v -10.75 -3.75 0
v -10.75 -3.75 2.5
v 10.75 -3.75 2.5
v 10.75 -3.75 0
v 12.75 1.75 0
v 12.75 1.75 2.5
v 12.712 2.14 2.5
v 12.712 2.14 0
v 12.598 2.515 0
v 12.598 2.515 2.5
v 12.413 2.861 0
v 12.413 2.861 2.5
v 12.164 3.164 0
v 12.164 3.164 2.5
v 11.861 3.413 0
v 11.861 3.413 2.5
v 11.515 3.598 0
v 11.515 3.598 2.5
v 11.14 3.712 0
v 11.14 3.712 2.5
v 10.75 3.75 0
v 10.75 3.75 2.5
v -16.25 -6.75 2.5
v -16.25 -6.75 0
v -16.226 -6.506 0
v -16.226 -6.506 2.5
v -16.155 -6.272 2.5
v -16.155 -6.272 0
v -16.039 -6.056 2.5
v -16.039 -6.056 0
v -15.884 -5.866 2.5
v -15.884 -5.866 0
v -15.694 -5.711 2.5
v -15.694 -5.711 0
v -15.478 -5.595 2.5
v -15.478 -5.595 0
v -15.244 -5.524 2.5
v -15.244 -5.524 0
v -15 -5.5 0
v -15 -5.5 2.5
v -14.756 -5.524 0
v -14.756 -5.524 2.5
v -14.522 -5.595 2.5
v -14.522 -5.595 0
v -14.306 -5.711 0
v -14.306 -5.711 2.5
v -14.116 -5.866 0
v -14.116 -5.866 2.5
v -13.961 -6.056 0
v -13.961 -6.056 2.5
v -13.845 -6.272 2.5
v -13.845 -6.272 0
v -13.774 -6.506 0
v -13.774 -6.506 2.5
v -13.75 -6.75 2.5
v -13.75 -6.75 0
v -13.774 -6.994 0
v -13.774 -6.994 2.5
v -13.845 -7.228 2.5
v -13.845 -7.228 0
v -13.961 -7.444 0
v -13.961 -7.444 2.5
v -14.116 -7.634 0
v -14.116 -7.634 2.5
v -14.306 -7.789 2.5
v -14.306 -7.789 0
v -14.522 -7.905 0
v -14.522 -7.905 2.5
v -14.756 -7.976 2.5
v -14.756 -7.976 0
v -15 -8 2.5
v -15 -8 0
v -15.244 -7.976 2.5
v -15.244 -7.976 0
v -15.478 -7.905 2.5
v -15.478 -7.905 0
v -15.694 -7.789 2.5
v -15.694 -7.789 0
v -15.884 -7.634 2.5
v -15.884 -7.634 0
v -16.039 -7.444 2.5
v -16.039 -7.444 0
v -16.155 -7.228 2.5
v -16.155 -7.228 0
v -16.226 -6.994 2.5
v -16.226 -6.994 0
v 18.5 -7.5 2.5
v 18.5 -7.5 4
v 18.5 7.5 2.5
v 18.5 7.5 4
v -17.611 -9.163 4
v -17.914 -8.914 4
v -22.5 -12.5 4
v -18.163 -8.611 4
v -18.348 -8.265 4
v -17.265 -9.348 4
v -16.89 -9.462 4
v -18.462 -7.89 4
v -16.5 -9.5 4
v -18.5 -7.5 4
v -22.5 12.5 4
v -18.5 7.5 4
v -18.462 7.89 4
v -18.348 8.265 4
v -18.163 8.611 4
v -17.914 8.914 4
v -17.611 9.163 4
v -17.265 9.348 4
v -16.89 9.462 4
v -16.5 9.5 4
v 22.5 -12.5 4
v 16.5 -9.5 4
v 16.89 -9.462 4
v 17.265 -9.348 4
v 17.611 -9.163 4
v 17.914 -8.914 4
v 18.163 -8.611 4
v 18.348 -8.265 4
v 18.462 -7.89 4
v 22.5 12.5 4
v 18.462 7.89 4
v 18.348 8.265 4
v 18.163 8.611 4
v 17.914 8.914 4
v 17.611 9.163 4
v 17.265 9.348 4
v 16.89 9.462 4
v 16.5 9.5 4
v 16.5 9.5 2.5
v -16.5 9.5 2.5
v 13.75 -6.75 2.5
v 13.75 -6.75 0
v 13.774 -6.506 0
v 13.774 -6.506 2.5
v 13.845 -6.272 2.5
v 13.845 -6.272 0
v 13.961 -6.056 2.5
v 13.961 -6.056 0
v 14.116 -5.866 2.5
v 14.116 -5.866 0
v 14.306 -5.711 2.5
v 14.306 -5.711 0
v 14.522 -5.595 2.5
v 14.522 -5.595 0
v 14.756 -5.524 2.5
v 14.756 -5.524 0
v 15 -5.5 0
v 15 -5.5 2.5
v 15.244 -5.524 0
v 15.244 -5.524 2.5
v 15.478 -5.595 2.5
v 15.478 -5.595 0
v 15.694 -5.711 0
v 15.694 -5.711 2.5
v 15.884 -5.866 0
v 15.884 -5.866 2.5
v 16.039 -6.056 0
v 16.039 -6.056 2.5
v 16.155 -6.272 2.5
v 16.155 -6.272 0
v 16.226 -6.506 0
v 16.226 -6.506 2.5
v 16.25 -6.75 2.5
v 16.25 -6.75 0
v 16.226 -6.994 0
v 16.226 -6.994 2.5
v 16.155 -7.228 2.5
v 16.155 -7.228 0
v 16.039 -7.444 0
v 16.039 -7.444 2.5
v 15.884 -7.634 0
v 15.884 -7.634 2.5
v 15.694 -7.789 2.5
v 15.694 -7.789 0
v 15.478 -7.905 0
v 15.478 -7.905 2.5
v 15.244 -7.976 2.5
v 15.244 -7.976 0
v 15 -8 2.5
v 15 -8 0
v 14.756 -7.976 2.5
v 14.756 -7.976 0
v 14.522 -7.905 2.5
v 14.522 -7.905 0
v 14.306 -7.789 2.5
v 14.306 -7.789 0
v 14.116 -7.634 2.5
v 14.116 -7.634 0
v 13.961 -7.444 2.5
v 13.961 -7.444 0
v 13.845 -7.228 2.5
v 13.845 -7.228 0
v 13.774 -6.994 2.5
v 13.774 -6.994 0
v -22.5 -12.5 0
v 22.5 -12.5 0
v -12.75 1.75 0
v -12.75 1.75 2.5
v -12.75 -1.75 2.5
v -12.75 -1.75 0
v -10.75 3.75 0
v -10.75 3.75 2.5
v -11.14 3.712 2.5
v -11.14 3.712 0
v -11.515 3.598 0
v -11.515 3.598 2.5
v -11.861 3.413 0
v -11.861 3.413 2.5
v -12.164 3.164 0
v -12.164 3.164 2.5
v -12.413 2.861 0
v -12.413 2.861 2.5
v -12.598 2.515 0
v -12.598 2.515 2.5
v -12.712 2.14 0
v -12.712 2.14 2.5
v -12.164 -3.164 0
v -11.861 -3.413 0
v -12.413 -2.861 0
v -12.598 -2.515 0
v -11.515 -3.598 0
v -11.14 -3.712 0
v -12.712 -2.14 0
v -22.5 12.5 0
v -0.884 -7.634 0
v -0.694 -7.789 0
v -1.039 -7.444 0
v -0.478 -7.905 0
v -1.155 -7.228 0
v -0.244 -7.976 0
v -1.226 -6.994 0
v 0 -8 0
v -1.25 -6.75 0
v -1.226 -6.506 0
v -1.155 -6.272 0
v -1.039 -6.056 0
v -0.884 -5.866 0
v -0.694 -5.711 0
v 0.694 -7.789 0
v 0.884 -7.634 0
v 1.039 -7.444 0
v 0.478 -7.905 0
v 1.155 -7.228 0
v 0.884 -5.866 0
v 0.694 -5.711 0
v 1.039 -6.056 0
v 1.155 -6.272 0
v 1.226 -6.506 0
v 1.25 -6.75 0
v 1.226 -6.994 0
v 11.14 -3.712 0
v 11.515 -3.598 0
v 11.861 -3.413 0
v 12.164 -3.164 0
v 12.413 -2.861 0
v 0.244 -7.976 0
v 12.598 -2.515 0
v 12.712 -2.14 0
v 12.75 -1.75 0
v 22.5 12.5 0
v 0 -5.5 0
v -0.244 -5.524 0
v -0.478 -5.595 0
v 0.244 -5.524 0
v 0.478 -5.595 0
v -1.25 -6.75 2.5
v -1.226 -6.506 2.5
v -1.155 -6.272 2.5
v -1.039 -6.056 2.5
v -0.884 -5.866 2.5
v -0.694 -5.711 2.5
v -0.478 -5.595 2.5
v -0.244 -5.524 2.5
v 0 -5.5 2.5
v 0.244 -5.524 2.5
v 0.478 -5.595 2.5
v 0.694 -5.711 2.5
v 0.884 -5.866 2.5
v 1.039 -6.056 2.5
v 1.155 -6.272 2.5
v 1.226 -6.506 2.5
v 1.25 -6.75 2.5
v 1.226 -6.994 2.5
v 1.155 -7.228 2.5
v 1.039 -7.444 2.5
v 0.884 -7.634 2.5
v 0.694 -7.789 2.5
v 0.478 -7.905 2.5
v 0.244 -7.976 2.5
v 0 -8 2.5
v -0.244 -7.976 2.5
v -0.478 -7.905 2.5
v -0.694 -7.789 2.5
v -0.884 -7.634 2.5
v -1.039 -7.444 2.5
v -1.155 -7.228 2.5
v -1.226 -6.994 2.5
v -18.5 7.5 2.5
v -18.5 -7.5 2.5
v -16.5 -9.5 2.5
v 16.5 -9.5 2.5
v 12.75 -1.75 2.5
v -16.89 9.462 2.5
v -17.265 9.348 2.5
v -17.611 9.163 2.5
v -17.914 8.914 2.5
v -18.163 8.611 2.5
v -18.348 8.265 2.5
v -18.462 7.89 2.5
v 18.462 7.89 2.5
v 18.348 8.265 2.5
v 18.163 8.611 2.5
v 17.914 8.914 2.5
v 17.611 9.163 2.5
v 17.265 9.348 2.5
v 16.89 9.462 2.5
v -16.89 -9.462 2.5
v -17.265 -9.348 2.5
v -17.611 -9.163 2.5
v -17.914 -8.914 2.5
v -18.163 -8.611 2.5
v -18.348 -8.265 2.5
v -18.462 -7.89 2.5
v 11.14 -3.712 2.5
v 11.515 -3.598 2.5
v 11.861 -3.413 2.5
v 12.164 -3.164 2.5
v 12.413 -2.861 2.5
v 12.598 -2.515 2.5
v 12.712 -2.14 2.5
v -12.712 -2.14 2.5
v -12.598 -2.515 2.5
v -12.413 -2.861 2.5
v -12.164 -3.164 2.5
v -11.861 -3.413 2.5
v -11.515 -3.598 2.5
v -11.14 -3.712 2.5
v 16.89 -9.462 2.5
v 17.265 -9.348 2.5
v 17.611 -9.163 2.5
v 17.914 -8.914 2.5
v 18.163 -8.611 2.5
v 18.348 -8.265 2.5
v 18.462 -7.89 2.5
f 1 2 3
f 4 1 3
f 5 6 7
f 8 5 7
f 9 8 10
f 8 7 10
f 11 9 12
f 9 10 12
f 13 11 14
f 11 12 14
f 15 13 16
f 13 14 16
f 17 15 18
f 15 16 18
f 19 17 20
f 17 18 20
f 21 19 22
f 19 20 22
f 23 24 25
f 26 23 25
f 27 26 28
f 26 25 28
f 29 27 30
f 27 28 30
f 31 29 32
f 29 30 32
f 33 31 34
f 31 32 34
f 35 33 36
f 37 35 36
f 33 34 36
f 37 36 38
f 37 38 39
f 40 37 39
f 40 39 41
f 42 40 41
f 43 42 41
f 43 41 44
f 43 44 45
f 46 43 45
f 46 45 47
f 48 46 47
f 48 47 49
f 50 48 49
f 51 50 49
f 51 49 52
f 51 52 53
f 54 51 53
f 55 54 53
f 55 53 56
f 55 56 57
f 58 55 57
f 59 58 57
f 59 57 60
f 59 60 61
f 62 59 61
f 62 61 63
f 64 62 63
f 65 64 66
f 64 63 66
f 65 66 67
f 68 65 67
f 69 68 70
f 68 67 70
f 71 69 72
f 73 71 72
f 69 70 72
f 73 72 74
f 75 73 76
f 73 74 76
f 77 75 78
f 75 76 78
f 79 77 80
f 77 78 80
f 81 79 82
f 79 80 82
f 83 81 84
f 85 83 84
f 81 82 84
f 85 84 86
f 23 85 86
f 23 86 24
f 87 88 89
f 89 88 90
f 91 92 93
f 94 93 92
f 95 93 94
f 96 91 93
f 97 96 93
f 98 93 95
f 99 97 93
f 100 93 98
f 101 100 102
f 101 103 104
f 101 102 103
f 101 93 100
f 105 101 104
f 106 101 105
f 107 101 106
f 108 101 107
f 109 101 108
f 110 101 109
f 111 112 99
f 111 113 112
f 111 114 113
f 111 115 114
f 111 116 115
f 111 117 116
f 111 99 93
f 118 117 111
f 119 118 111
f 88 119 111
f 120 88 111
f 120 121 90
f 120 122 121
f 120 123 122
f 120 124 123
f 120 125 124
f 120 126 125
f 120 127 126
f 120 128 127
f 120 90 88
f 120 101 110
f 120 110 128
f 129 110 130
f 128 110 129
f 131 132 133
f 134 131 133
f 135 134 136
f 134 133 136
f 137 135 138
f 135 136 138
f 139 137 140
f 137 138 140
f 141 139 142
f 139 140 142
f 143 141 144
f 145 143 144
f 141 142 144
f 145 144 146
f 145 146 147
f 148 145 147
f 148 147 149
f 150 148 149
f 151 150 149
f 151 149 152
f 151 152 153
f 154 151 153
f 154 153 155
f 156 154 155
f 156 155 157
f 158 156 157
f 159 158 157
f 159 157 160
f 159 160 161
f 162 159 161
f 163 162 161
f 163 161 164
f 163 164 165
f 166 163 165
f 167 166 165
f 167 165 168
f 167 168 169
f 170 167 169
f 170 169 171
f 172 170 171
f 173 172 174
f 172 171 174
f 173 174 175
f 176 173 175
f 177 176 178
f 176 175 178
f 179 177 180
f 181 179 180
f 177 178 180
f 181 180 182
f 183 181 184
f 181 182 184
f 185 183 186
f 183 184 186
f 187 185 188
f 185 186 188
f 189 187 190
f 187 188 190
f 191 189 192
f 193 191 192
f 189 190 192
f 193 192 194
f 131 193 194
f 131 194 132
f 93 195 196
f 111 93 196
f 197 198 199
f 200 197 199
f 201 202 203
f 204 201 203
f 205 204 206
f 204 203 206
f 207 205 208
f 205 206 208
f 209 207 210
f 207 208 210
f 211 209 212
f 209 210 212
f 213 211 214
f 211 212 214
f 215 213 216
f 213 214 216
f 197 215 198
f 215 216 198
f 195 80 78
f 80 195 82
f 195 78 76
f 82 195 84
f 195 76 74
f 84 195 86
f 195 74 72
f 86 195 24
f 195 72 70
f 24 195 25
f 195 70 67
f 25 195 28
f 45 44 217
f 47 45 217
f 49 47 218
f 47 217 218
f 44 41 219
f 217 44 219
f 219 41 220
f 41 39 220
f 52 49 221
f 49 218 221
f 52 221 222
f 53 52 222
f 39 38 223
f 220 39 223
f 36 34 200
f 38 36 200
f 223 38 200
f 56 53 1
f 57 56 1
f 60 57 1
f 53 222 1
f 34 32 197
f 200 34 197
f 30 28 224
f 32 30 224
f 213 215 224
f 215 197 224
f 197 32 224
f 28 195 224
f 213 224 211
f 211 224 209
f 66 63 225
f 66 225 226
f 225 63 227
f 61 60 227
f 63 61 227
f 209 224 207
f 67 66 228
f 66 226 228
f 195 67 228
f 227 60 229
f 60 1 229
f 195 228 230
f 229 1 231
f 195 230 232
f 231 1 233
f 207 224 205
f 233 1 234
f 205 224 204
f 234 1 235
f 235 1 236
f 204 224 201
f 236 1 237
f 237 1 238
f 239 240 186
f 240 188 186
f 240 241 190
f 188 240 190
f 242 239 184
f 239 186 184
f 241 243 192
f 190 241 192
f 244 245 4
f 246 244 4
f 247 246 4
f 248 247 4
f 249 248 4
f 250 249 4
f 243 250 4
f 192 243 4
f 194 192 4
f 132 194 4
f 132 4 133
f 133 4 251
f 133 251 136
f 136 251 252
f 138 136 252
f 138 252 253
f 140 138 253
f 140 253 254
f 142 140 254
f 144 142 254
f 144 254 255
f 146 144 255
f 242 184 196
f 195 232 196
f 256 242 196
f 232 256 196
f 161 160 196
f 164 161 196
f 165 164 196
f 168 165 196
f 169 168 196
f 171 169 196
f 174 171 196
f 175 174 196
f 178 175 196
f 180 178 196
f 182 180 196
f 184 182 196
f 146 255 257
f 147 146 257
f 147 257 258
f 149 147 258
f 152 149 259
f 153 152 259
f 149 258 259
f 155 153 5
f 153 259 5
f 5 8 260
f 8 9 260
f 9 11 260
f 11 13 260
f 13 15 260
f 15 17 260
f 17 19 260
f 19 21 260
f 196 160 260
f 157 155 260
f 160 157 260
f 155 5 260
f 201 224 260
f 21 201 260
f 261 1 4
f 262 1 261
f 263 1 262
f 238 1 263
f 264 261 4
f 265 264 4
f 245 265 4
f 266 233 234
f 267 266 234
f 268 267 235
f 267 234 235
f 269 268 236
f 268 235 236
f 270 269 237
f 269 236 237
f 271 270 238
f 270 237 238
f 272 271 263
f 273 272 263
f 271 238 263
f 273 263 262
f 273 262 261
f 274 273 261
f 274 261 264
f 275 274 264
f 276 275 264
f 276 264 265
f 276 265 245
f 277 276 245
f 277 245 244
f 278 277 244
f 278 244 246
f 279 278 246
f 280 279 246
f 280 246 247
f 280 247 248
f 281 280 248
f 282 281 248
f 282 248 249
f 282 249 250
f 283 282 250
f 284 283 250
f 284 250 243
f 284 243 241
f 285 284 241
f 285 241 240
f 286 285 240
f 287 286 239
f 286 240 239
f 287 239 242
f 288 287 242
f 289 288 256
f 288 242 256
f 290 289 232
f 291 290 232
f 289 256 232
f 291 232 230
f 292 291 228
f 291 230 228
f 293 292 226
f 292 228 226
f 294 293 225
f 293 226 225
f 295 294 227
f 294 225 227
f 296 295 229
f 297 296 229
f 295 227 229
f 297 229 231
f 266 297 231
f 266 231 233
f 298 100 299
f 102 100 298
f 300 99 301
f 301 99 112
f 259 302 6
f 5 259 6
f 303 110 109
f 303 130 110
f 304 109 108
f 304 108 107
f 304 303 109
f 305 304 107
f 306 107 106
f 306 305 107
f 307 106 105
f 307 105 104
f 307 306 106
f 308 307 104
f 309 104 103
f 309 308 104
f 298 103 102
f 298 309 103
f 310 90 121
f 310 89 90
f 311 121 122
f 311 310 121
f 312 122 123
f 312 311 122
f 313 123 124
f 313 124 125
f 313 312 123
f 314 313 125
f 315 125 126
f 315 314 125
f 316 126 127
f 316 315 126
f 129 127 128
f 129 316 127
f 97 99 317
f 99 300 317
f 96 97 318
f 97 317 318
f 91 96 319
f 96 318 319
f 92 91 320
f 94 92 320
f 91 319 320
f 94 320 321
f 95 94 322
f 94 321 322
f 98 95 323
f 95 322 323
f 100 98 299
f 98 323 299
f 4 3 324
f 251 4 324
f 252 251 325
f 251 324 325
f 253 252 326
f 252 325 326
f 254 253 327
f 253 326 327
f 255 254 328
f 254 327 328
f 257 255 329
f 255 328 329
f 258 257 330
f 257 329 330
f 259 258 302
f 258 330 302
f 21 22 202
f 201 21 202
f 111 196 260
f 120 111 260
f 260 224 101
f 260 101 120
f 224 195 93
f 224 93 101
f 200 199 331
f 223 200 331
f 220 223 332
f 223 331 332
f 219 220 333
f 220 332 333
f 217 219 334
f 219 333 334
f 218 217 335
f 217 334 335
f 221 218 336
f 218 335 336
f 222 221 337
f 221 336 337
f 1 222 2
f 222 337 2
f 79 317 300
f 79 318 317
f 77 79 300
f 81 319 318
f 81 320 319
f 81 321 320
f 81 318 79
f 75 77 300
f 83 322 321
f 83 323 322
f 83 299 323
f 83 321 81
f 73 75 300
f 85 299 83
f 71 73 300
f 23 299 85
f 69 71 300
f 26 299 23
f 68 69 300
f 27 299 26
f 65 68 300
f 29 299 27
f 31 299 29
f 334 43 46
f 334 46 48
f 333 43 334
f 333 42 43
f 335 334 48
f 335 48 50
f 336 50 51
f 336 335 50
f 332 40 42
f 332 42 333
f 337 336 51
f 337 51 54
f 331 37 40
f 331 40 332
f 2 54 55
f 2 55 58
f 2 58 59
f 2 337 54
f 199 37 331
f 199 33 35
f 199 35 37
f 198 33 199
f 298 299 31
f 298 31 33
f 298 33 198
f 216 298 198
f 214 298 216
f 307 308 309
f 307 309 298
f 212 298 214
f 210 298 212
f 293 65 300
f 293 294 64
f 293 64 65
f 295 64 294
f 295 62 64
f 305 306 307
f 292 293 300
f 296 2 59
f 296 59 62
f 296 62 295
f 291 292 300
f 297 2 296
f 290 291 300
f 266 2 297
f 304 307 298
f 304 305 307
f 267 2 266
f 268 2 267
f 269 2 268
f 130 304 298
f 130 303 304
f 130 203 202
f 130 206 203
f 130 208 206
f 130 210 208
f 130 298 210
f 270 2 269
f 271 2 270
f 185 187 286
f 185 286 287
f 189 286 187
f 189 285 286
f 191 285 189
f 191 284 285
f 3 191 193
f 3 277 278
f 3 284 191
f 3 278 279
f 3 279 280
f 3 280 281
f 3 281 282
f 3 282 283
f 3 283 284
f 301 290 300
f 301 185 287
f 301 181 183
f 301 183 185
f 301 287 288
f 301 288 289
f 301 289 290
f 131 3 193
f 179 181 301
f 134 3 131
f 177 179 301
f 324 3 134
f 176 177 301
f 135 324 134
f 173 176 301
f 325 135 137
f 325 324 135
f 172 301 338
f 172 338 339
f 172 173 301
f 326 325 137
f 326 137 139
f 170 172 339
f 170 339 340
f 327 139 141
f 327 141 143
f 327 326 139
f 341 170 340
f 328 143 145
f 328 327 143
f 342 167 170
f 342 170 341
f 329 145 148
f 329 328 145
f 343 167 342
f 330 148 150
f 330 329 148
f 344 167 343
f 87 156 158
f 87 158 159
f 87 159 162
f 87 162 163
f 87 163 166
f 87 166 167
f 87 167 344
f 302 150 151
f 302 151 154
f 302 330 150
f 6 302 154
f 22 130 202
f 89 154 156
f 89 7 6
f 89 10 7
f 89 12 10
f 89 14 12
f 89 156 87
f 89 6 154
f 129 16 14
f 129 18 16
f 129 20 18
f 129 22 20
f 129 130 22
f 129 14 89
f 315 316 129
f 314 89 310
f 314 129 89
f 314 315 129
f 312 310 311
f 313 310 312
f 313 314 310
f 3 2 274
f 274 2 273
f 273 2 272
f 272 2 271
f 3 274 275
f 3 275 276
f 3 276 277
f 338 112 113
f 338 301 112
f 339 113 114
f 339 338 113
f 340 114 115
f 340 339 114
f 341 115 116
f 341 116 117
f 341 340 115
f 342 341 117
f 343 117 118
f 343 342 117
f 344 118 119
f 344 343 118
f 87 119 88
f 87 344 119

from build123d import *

# Parameters (mm, degrees)
SKETCH1_W             = 45
SKETCH1_H             = 25
BOSS_EXTRUDE1_DEPTH   = 4
SKETCH2_W             = 37
SKETCH2_H             = 19
CUT_EXTRUDE1_DEPTH    = 1.5
FILLET1_R             = 2
CUT_EXTRUDE2_DEPTH    = 26.860201082
F_2_5MM_DOWEL_HOLE1_D = 2.5


with BuildPart() as part:
    # Sketch1 → Boss-Extrude1 (new body)
    with BuildSketch(Plane.XY):
        Rectangle(SKETCH1_W, SKETCH1_H)
    extrude(amount=BOSS_EXTRUDE1_DEPTH)

    # Sketch2 → Cut-Extrude1 (cut)
    with BuildSketch(Plane.XY.offset(4)):
        Rectangle(SKETCH2_W, SKETCH2_H)
    extrude(amount=-CUT_EXTRUDE1_DEPTH, mode=Mode.SUBTRACT)

    # Fillet1
    fillet1_edges = [part.edges().sort_by_distance(p)[0] for p in [
        (18.5, 9.5, 3.25),
        (18.5, -9.5, 3.25),
        (-18.5, -9.5, 3.25),
        (-18.5, 9.5, 3.25),
    ]]
    fillet(fillet1_edges, radius=FILLET1_R)

    # Sketch3 → Cut-Extrude2 (cut, through all)
    with BuildSketch(Plane.XY.offset(2.5)):
        with BuildLine():
            Line((-10.75, -3.75), (10.75, -3.75))
            ThreePointArc((10.75, -3.75), (12.164213562, -3.164213562), (12.75, -1.75))
            Line((12.75, -1.75), (12.75, 1.75))
            ThreePointArc((12.75, 1.75), (12.164213562, 3.164213562), (10.75, 3.75))
            Line((10.75, 3.75), (-10.75, 3.75))
            ThreePointArc((-10.75, 3.75), (-12.164213562, 3.164213562), (-12.75, 1.75))
            Line((-12.75, 1.75), (-12.75, -1.75))
            ThreePointArc((-12.75, -1.75), (-12.164213562, -3.164213562), (-10.75, -3.75))
        make_face()
    extrude(amount=-CUT_EXTRUDE2_DEPTH, mode=Mode.SUBTRACT)

    # Ø2.5mm Dowel Hole1 (through all)
    with Locations(Plane.XY.offset(2.5)):
        with Locations((-15, -6.75), (0, -6.75), (15, -6.75)):
            Hole(F_2_5MM_DOWEL_HOLE1_D / 2)


solid = part.part
